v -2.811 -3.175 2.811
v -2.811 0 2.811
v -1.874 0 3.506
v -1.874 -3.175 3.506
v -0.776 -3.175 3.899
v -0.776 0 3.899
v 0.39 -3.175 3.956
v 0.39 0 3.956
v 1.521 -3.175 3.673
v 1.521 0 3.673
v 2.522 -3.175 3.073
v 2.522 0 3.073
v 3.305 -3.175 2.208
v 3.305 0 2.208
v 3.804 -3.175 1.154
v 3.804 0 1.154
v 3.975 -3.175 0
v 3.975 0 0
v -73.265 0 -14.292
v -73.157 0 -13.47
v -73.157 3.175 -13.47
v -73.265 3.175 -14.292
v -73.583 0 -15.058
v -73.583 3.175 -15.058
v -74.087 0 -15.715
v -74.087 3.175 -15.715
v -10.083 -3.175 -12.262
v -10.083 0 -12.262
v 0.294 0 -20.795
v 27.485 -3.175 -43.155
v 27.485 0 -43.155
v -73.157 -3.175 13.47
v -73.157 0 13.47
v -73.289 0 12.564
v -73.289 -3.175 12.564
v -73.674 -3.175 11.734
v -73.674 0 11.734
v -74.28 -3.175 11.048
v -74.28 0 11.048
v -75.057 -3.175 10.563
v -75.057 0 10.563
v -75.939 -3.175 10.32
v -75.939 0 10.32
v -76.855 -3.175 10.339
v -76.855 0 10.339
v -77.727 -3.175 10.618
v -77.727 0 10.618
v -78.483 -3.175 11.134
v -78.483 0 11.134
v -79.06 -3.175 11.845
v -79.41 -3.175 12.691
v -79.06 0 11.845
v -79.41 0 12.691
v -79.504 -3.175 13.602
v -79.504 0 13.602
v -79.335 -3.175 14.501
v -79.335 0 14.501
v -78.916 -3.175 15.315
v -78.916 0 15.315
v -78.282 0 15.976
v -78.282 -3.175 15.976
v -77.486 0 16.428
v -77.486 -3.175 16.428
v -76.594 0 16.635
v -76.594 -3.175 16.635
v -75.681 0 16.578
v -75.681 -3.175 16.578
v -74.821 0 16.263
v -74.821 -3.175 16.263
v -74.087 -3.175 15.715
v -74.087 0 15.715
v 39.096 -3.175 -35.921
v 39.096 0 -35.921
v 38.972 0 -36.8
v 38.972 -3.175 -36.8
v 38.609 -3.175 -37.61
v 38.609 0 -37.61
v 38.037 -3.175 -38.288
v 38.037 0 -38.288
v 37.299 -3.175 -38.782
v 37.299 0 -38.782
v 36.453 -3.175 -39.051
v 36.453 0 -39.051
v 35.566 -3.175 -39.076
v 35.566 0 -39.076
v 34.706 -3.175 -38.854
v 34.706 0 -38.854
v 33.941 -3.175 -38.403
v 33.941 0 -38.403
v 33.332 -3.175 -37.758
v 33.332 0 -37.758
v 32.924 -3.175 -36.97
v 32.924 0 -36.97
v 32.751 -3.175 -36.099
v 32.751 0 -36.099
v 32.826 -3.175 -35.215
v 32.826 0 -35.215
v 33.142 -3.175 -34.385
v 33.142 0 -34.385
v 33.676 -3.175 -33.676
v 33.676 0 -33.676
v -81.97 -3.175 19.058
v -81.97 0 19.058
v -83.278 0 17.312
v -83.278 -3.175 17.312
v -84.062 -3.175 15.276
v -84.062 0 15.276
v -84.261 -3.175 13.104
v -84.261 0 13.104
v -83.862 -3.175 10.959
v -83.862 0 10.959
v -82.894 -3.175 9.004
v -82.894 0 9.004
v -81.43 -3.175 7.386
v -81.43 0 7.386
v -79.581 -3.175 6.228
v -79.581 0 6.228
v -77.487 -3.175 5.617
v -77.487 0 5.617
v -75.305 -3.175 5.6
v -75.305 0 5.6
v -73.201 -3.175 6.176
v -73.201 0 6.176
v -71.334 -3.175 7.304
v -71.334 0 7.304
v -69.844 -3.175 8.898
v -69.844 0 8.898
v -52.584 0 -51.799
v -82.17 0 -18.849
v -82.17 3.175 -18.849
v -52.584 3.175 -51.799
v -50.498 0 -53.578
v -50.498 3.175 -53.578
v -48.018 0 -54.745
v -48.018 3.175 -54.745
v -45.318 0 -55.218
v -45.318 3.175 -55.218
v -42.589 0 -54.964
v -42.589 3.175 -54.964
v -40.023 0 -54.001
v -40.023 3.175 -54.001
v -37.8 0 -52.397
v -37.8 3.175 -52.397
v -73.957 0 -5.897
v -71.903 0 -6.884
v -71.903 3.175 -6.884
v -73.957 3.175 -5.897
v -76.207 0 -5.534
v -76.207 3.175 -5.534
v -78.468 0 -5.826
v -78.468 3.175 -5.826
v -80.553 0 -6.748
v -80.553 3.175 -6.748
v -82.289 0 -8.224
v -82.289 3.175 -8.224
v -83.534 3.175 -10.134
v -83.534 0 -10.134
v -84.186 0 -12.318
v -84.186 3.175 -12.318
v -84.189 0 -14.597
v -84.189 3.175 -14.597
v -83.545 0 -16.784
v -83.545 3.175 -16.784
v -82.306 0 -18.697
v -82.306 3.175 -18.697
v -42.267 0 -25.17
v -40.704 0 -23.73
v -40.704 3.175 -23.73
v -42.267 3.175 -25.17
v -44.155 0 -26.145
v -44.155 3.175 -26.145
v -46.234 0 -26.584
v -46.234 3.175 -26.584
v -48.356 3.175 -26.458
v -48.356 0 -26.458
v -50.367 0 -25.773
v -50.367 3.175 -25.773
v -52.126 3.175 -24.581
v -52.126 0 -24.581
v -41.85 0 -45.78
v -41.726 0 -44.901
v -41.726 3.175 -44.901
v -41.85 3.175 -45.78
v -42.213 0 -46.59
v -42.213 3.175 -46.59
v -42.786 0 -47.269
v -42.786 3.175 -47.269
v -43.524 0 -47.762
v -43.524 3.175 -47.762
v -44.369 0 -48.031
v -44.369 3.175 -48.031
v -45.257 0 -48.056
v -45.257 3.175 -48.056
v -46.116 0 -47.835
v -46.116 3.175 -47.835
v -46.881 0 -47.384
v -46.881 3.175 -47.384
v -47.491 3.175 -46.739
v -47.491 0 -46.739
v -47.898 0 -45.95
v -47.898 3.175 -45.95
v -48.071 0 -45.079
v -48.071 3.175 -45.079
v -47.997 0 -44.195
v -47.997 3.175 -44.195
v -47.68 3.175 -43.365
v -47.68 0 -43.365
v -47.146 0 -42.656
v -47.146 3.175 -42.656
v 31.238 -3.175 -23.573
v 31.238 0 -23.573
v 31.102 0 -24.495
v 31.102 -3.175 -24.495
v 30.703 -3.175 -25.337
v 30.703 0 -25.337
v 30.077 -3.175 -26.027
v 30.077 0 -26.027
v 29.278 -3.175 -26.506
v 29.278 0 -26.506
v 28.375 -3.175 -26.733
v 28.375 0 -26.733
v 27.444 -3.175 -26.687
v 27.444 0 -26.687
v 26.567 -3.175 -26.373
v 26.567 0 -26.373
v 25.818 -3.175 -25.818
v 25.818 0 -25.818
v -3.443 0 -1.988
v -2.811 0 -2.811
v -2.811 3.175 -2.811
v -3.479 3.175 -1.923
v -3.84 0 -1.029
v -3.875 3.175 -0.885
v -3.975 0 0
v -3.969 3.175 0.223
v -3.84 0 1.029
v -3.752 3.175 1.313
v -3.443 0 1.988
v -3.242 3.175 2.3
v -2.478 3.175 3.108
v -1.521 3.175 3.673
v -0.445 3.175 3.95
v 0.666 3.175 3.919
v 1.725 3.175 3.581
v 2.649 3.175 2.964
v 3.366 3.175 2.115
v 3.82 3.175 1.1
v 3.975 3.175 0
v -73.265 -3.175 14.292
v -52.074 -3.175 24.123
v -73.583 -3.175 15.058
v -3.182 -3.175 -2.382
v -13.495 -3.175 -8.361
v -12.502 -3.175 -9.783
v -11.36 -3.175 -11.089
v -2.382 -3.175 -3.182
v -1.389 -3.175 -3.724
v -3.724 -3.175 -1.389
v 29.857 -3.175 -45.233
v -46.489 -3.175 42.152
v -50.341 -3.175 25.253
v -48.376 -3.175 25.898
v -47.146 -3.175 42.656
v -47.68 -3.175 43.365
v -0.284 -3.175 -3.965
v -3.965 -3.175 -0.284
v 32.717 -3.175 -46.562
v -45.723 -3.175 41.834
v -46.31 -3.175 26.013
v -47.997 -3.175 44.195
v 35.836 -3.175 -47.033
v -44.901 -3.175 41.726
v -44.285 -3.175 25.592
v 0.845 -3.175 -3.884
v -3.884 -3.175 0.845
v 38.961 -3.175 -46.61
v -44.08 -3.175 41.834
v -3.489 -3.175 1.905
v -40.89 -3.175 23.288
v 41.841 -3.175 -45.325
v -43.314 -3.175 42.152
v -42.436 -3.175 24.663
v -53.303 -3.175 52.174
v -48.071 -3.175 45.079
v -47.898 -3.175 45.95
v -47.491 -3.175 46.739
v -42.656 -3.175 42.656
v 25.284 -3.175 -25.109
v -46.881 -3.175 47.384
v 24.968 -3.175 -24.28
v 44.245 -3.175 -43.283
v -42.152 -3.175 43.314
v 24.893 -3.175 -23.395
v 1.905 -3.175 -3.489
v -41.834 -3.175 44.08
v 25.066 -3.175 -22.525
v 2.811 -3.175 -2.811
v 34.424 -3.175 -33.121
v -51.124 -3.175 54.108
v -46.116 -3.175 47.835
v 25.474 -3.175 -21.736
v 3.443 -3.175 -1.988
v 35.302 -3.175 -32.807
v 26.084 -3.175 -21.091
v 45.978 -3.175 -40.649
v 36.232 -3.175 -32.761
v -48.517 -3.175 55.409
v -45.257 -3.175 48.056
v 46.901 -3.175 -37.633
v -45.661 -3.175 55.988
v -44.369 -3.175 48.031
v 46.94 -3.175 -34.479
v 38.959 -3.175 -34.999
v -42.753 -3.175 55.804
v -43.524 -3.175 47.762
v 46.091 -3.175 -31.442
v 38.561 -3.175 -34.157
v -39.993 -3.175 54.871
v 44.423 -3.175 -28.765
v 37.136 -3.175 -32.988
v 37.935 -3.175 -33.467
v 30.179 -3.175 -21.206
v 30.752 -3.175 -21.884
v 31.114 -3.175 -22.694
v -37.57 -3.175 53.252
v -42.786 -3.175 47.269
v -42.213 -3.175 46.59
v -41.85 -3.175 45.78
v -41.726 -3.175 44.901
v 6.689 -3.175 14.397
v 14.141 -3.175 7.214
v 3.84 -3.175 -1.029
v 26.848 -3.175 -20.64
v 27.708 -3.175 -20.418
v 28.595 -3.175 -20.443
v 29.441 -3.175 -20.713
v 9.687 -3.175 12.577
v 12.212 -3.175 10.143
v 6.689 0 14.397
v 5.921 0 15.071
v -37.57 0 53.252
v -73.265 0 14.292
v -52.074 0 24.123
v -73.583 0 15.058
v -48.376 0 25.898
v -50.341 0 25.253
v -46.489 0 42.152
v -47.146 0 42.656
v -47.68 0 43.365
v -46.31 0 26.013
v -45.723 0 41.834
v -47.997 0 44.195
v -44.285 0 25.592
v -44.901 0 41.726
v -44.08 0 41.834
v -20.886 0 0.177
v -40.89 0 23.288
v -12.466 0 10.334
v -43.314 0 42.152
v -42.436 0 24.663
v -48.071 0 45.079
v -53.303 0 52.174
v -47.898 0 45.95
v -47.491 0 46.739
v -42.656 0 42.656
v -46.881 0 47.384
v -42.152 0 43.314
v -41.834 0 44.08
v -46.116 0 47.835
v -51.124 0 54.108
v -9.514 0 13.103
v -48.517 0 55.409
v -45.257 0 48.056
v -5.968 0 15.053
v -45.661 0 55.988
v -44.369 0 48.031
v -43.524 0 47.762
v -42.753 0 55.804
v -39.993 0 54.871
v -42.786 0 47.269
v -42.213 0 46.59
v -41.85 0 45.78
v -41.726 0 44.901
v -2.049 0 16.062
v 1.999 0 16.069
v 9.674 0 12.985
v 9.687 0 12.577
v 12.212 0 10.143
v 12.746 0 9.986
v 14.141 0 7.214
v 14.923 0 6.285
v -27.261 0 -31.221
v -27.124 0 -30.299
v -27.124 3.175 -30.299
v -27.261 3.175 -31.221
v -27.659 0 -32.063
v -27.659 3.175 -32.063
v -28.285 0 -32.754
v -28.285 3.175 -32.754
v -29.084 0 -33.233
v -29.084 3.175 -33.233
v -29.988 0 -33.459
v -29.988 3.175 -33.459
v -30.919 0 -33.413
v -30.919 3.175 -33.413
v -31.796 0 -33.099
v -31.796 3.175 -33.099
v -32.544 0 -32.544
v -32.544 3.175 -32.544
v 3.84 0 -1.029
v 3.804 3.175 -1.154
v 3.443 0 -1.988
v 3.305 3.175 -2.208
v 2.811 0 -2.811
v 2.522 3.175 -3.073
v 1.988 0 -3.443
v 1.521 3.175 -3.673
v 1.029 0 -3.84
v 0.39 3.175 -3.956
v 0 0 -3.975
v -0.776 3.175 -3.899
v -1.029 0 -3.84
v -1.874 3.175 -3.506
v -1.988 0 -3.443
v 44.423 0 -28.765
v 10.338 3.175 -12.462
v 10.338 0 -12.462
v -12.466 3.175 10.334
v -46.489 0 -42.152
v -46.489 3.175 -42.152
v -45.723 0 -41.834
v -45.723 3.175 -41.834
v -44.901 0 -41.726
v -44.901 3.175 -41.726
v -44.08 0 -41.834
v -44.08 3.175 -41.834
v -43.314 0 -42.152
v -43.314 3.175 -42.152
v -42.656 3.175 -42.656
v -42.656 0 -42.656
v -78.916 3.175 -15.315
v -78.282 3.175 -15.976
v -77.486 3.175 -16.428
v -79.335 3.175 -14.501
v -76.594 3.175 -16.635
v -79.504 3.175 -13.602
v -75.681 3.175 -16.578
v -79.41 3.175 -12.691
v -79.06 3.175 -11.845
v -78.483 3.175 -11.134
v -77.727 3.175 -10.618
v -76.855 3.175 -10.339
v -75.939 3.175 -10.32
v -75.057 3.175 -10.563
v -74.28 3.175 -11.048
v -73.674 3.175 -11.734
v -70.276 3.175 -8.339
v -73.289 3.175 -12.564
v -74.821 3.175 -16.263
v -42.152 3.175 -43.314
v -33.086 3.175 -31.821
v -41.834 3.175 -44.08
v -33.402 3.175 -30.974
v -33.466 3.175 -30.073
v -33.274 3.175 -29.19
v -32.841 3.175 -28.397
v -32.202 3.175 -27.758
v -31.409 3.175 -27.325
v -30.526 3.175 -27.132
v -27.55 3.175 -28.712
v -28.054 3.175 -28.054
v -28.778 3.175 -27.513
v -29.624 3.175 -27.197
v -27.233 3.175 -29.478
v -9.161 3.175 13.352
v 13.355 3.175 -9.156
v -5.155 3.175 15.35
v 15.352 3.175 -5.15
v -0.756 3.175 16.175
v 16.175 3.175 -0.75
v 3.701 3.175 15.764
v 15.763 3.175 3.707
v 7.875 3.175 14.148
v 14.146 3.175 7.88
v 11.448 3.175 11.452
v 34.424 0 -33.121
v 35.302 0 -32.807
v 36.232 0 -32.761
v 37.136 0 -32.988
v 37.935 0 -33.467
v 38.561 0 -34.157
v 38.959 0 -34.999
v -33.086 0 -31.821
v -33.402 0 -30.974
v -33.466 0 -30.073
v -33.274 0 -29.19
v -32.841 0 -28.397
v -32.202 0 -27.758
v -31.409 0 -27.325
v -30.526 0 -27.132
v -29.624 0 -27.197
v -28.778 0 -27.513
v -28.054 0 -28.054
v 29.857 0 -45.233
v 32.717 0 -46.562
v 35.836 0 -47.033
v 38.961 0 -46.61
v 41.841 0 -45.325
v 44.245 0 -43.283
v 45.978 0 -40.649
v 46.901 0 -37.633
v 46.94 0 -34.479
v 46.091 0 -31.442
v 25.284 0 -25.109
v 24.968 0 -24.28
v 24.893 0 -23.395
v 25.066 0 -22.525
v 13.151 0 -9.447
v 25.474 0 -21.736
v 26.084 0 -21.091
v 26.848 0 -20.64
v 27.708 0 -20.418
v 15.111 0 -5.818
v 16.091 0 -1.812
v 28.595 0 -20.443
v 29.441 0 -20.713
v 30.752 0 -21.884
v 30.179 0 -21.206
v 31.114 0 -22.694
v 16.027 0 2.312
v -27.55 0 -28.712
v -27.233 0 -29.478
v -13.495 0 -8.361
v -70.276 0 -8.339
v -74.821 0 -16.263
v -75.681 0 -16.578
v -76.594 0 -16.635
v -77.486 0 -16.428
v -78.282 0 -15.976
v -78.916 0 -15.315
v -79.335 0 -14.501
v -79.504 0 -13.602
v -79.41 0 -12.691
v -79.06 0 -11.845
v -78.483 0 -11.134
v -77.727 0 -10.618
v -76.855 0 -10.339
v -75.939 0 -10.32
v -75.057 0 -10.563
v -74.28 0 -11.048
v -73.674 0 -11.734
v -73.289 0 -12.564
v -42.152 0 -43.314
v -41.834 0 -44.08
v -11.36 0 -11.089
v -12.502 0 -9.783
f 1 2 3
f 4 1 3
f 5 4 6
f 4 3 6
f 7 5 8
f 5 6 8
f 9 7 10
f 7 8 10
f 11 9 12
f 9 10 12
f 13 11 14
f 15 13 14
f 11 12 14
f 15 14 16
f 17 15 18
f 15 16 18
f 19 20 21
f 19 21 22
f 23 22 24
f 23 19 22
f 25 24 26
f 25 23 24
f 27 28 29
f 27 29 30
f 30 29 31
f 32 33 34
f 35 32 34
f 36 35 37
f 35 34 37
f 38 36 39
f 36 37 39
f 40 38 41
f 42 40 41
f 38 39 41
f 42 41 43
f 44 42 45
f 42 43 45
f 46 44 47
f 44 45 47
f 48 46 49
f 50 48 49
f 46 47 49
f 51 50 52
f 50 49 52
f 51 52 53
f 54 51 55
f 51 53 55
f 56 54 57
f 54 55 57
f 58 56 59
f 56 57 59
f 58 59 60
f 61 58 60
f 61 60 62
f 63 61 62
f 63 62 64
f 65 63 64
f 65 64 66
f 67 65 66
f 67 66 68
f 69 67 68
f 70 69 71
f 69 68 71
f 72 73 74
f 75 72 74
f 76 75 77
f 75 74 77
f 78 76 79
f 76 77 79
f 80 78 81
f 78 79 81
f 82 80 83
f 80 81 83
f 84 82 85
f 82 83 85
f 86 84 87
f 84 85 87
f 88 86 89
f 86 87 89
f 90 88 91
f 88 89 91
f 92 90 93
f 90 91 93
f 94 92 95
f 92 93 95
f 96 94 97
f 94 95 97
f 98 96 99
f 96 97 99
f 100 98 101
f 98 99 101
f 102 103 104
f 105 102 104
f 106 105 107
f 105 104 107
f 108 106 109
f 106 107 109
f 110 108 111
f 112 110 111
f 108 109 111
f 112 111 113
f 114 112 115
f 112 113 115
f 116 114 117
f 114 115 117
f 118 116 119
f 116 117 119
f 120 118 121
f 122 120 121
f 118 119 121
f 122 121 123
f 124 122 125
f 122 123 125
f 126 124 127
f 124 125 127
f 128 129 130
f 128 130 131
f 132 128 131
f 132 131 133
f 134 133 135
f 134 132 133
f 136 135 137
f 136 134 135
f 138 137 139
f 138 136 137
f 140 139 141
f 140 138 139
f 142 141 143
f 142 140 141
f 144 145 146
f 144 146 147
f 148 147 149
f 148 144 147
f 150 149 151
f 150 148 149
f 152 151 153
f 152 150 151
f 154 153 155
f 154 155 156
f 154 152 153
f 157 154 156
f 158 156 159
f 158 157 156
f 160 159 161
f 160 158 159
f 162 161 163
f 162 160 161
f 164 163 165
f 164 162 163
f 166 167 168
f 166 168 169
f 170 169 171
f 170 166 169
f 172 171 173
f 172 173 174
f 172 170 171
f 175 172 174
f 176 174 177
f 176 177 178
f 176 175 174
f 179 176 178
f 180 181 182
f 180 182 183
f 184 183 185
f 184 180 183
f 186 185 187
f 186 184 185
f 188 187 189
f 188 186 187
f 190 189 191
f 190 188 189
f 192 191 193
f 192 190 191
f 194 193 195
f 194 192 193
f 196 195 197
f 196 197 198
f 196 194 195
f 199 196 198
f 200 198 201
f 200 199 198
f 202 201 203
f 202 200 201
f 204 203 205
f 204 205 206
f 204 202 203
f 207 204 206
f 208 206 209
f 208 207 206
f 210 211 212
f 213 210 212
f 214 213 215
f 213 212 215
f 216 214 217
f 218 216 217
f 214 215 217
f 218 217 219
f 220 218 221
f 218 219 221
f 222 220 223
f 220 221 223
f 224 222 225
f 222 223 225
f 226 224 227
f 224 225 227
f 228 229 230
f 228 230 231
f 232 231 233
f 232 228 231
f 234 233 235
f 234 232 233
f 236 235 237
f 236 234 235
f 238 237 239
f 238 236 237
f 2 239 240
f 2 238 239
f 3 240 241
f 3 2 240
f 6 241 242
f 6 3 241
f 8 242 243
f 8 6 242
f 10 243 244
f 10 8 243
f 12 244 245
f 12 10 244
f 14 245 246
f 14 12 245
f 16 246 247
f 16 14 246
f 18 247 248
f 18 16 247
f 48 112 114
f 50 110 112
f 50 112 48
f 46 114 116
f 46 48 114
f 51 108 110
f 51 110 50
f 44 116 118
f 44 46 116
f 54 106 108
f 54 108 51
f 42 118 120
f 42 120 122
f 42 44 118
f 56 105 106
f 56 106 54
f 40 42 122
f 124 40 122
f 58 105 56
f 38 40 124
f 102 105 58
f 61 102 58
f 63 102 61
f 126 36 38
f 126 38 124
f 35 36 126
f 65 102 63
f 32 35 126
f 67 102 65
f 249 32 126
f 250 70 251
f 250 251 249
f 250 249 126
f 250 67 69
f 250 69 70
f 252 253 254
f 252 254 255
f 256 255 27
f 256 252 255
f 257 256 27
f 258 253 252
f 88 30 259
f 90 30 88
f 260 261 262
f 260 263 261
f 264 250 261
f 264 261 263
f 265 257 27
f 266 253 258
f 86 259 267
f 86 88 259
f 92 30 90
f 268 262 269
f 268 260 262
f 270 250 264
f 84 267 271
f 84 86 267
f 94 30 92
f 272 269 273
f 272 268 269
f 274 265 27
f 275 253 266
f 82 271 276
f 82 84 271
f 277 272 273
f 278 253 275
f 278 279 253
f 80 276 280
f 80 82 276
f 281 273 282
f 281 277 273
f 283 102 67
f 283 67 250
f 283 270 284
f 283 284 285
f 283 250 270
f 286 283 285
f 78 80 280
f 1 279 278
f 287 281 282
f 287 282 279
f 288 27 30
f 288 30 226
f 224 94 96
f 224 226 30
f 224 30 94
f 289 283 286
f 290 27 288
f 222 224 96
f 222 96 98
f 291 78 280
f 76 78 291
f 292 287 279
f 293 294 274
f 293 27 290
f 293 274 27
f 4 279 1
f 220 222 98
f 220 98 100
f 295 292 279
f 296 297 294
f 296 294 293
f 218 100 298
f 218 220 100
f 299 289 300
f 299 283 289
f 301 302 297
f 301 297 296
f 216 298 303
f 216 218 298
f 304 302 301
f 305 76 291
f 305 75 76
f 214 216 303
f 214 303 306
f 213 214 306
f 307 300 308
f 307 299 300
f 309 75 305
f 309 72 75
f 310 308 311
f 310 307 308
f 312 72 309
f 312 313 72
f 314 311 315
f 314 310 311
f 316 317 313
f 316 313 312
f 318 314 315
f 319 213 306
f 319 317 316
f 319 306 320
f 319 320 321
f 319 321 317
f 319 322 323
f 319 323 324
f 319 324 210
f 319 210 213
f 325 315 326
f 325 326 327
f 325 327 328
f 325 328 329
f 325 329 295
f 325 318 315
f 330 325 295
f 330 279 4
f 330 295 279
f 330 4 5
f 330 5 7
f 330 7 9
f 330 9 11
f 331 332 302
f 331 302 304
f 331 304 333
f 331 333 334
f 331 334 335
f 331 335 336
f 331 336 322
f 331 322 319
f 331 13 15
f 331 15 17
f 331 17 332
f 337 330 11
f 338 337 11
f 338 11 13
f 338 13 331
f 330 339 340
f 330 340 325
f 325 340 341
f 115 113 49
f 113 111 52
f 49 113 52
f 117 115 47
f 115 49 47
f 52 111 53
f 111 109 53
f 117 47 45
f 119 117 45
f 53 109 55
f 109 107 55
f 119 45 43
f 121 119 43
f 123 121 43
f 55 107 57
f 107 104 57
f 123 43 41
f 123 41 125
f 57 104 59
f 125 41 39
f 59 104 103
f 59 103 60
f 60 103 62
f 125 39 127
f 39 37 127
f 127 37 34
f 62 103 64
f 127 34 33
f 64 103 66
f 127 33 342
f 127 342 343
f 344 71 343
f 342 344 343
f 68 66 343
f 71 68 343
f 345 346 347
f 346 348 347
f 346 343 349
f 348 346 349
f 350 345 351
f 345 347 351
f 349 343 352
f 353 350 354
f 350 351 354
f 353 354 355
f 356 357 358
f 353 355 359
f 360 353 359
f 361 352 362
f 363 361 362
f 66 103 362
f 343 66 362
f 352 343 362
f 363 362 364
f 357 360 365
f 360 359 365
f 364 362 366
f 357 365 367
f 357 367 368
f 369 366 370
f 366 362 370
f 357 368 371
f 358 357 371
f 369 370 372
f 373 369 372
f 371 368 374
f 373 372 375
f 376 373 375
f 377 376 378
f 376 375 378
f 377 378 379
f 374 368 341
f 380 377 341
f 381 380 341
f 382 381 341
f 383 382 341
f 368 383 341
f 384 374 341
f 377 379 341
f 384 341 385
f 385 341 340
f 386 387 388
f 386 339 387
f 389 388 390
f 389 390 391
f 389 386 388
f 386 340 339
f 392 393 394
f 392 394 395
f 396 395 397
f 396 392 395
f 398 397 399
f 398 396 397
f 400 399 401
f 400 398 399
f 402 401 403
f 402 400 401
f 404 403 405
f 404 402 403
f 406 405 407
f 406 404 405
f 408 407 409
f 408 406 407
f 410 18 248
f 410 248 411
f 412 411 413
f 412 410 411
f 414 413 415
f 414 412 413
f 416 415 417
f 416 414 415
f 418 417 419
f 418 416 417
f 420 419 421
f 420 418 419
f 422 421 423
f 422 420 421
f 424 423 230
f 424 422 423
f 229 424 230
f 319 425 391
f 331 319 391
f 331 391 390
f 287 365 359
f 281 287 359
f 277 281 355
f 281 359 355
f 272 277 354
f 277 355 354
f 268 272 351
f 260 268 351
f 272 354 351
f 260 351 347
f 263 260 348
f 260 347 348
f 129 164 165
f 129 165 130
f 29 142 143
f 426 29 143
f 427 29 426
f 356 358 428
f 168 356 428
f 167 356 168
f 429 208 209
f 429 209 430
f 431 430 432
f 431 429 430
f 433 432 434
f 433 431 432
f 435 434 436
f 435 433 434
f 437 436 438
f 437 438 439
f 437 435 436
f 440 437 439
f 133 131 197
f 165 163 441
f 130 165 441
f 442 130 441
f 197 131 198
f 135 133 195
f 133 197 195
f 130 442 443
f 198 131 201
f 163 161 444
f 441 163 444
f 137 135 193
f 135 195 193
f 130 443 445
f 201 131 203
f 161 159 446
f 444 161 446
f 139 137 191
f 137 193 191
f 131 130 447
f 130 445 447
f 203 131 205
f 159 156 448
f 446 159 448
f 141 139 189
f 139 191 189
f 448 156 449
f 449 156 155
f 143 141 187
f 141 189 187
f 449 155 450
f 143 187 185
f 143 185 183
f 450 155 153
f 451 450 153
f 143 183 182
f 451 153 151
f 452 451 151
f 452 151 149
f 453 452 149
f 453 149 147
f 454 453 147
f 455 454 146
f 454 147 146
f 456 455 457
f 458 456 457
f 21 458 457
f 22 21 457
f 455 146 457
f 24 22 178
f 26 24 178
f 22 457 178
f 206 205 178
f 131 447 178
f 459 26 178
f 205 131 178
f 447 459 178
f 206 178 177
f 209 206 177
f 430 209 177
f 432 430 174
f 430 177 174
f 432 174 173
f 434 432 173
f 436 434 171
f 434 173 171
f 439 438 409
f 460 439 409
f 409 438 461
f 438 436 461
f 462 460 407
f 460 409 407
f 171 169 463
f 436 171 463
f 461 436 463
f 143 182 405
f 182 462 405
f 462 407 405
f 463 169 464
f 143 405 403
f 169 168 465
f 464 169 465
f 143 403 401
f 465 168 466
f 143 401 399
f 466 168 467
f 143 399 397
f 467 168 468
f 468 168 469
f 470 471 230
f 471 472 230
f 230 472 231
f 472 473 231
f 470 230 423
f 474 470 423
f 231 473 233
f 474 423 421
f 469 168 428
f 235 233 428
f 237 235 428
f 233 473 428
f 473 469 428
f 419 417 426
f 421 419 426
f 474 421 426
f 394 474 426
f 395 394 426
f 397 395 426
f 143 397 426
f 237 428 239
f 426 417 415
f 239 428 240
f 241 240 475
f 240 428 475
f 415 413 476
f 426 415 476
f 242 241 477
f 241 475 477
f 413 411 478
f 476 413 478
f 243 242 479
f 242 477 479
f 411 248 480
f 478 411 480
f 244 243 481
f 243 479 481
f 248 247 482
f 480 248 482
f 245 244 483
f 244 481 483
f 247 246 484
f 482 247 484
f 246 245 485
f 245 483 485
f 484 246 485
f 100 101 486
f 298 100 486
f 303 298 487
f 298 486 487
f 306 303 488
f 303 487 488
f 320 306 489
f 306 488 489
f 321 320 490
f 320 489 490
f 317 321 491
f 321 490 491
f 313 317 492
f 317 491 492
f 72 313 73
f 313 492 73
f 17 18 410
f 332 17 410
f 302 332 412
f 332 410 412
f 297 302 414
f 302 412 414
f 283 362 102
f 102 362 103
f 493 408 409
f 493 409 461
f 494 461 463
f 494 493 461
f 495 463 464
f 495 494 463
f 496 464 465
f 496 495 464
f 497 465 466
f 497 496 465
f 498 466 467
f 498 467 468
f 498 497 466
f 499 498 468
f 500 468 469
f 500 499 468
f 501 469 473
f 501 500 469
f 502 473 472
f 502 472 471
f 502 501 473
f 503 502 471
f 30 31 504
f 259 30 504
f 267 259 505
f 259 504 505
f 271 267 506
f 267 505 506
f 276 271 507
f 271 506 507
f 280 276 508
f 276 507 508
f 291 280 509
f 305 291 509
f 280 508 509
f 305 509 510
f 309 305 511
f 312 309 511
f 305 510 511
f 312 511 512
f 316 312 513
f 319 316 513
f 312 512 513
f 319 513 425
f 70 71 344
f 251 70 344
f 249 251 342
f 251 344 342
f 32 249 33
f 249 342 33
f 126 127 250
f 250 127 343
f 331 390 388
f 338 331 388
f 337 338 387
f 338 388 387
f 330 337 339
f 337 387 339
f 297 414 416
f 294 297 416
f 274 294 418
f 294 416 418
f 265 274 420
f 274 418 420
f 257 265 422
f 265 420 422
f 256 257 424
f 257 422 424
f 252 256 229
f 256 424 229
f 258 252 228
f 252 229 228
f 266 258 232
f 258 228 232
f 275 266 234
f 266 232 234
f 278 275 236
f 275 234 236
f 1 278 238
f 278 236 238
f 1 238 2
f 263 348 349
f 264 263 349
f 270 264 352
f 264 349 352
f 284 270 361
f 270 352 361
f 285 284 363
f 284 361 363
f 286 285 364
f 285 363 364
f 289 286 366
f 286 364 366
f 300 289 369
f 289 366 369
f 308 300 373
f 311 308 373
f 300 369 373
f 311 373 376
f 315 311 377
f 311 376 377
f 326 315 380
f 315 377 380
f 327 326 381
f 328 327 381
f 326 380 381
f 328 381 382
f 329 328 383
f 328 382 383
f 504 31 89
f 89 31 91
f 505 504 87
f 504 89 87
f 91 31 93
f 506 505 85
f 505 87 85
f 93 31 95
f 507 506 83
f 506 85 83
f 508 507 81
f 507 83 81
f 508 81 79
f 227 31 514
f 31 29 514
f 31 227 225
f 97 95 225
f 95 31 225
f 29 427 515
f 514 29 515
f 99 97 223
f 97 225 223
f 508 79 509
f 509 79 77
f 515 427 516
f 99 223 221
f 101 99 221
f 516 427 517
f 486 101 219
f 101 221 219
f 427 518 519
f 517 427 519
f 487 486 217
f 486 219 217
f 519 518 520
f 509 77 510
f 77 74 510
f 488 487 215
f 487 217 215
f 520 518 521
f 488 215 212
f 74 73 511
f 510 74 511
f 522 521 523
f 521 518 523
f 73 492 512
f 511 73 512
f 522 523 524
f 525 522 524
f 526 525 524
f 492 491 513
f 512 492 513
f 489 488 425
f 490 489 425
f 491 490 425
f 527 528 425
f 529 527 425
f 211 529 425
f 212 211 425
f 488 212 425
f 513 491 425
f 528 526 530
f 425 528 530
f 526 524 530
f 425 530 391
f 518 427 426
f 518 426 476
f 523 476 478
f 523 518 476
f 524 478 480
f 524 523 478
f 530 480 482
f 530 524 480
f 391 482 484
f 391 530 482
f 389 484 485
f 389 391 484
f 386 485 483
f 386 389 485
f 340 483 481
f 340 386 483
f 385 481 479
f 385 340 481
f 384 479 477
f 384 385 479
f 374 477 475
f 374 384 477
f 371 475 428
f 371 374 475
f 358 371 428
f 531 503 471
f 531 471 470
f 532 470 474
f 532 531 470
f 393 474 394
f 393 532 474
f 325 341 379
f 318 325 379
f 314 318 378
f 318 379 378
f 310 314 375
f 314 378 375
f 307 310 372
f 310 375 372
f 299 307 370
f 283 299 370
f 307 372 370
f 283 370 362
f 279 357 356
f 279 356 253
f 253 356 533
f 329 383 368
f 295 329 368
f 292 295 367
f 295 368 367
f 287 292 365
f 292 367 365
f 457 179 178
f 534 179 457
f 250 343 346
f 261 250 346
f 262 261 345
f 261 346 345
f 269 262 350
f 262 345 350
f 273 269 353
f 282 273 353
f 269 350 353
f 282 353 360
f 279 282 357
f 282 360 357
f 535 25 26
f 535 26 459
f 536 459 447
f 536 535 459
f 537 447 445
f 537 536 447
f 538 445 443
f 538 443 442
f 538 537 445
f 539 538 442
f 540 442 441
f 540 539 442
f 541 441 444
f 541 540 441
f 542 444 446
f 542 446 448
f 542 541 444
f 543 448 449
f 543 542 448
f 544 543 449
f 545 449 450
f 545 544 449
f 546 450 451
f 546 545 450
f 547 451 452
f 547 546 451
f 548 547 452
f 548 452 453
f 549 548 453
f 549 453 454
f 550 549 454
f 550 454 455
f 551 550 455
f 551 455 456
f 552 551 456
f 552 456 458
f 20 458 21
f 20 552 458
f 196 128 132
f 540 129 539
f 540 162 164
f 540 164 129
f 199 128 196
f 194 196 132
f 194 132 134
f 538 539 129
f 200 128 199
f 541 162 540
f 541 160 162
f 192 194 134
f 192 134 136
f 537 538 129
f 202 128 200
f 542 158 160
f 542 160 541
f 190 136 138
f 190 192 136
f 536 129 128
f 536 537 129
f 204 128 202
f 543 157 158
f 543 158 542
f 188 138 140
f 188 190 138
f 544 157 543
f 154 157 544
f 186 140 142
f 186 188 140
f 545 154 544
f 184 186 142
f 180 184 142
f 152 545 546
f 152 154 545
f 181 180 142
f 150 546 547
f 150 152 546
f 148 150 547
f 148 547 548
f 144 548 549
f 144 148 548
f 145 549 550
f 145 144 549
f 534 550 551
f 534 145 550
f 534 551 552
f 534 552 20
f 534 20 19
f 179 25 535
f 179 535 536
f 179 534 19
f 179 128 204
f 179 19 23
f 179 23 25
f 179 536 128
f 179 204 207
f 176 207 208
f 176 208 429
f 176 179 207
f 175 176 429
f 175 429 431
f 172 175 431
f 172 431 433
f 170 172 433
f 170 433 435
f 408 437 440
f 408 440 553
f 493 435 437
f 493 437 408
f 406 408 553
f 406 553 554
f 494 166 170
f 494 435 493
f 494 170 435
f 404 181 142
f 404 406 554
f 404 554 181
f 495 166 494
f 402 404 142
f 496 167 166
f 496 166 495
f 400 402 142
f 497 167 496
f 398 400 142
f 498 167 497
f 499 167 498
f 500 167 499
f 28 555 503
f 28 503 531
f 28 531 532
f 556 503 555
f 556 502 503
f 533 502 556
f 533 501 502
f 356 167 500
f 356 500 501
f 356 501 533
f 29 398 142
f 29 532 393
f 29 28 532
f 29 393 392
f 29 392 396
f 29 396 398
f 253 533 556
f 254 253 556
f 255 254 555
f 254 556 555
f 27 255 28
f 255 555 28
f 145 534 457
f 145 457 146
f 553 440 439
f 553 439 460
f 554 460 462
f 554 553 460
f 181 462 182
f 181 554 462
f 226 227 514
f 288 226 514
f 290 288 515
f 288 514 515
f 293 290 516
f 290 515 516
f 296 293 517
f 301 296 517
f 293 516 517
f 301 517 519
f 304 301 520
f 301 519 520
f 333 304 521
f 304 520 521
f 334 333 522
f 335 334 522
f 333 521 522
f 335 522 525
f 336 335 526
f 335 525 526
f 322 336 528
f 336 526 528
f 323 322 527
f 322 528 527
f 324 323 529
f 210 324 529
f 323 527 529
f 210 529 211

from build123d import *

# Parameters (mm, degrees)
F1_DEPTH = 3.175
F3_DEPTH = 3.175


with BuildPart() as f1:
    # F0 (on Front) → F1 (new body)
    with BuildSketch(Plane.XZ):
        with BuildLine():
            ThreePointArc((-13.4948678072, -8.3608712384), (-15.7694846608, 1.8272872063), (-11.2253201513, 11.2253201513))
            Line((-11.2253201513, 11.2253201513), (-37.0435564994, 37.0435564994))
            ThreePointArc((-37.0435564994, 37.0435564994), (-44.9012806053, 33.7887806053), (-52.7590047113, 37.0435564994))
            Line((-52.7590047113, 37.0435564994), (-70.7195169534, 19.0830442573))
            ThreePointArc((-70.7195169534, 19.0830442573), (-68.9988832398, 16.507933926), (-68.3946770291, 13.4703841816))
            ThreePointArc((-68.3946770291, 13.4703841816), (-68.7656870241, 11.0720232299), (-69.8440339436, 8.8978678555))
            Line((-69.8440339436, 8.8978678555), (-52.0741189422, 24.1225312549))
            ThreePointArc((-52.0741189422, 24.1225312549), (-46.3101415882, 26.0133414911), (-40.8904602416, 23.2883364656))
            Line((-40.8904602416, 23.2883364656), (-13.4948678072, -8.3608712384))
        make_face()
        with BuildLine():
            Line((-70.7195169534, 19.0830442573), (-52.7590047113, 37.0435564994))
            ThreePointArc((-52.7590047113, 37.0435564994), (-56.0066011093, 44.501890128), (-53.3031631019, 52.1742460778))
            Line((-53.3031631019, 52.1742460778), (-81.9696297644, 19.0581415947))
            ThreePointArc((-81.9696297644, 19.0581415947), (-76.3497470218, 21.4078647356), (-70.7195169534, 19.0830442573))
        make_face()
        with BuildLine():
            ThreePointArc((-52.7590047113, 37.0435564994), (-44.9012806053, 33.7887806053), (-37.0435564994, 37.0435564994))
            Line((-37.0435564994, 37.0435564994), (-42.6562165751, 42.6562165751))
            ThreePointArc((-42.6562165751, 42.6562165751), (-44.9012806053, 41.7262806053), (-47.1463446356, 42.6562165751))
            Line((-47.1463446356, 42.6562165751), (-52.7590047113, 37.0435564994))
        make_face()
        with BuildLine():
            Line((-37.0435564994, 37.0435564994), (-11.2253201513, 11.2253201513))
            ThreePointArc((-11.2253201513, 11.2253201513), (-2.7677824051, 15.6318586725), (6.6885940582, 14.397164114))
            Line((6.6885940582, 14.397164114), (-37.5698837561, 53.2522252519))
            ThreePointArc((-37.5698837561, 53.2522252519), (-34.7780942558, 49.4848113821), (-33.7887806053, 44.9012806053))
            ThreePointArc((-33.7887806053, 44.9012806053), (-34.6346693003, 40.6487109632), (-37.0435564994, 37.0435564994))
        make_face()
        with BuildLine():
            Line((-42.6562165751, 42.6562165751), (-37.0435564994, 37.0435564994))
            ThreePointArc((-37.0435564994, 37.0435564994), (-34.6346693003, 40.6487109632), (-33.7887806053, 44.9012806053))
            ThreePointArc((-33.7887806053, 44.9012806053), (-34.7780942558, 49.4848113821), (-37.5698837561, 53.2522252519))
            ThreePointArc((-37.5698837561, 53.2522252519), (-45.6608822478, 55.9877886938), (-53.3031631019, 52.1742460778))
            ThreePointArc((-53.3031631019, 52.1742460778), (-56.0066011093, 44.501890128), (-52.7590047113, 37.0435564994))
            Line((-52.7590047113, 37.0435564994), (-47.1463446356, 42.6562165751))
            ThreePointArc((-47.1463446356, 42.6562165751), (-46.1163005031, 47.8345981211), (-41.7262806053, 44.9012806053))
            ThreePointArc((-41.7262806053, 44.9012806053), (-41.9679630896, 43.6862607076), (-42.6562165751, 42.6562165751))
        make_face()
        with BuildLine():
            ThreePointArc((-68.3946770291, 13.4703841816), (-68.9988832398, 16.507933926), (-70.7195169534, 19.0830442573))
            ThreePointArc((-70.7195169534, 19.0830442573), (-76.3497470218, 21.4078647356), (-81.9696297644, 19.0581415947))
            ThreePointArc((-81.9696297644, 19.0581415947), (-81.4300892617, 7.3863725841), (-69.8440339436, 8.8978678555))
            ThreePointArc((-69.8440339436, 8.8978678555), (-68.7656870241, 11.0720232299), (-68.3946770291, 13.4703841816))
        make_face()
        with BuildLine():
            ThreePointArc((-73.1571770291, 13.4703841816), (-79.2654945448, 12.2553642838), (-74.0871129988, 15.7154482119))
            ThreePointArc((-74.0871129988, 15.7154482119), (-73.3988595134, 14.6854040794), (-73.1571770291, 13.4703841816))
        make_face(mode=Mode.SUBTRACT)
        with BuildLine():
            ThreePointArc((-2.8108201659, 2.8108201659), (1.521204912, 3.6725135297), (3.9751, 0))
            ThreePointArc((3.9751, 0), (3.6725135297, -1.521204912), (2.8108201659, -2.8108201659))
            Line((2.8108201659, -2.8108201659), (11.2253201513, -11.2253201513))
            ThreePointArc((11.2253201513, -11.2253201513), (14.6665875786, -6.0750994888), (15.875, 0))
            ThreePointArc((15.875, 0), (15.4354295053, 3.7098707505), (14.1410609782, 7.2142927173))
            ThreePointArc((14.1410609782, 7.2142927173), (11.0166711219, 11.4301610833), (6.6885940582, 14.397164114))
            ThreePointArc((6.6885940582, 14.397164114), (-2.7677824051, 15.6318586725), (-11.2253201513, 11.2253201513))
            Line((-11.2253201513, 11.2253201513), (-2.8108201659, 2.8108201659))
        make_face()
        with BuildLine():
            ThreePointArc((2.8108201659, -2.8108201659), (-2.8108201659, -2.8108201659), (-2.8108201659, 2.8108201659))
            Line((-2.8108201659, 2.8108201659), (-11.2253201513, 11.2253201513))
            ThreePointArc((-11.2253201513, 11.2253201513), (-15.7694846608, 1.8272872063), (-13.4948678072, -8.3608712384))
            ThreePointArc((-13.4948678072, -8.3608712384), (-11.9491778628, -10.4514483878), (-10.0829819903, -12.2616923458))
            ThreePointArc((-10.0829819903, -12.2616923458), (0.7712009789, -15.8562566216), (11.2253201513, -11.2253201513))
            Line((11.2253201513, -11.2253201513), (2.8108201659, -2.8108201659))
        make_face()
        with BuildLine():
            Line((25.8182363481, -25.8182363481), (11.2253201513, -11.2253201513))
            ThreePointArc((11.2253201513, -11.2253201513), (0.7712009789, -15.8562566216), (-10.0829819903, -12.2616923458))
            Line((-10.0829819903, -12.2616923458), (27.4852123563, -43.1546079663))
            ThreePointArc((27.4852123563, -43.1546079663), (24.8166684953, -35.4956607342), (28.0633003783, -28.0633003783))
            Line((28.0633003783, -28.0633003783), (25.8182363481, -25.8182363481))
        make_face()
        with BuildLine():
            ThreePointArc((15.875, 0), (14.6665875786, -6.0750994888), (11.2253201513, -11.2253201513))
            Line((11.2253201513, -11.2253201513), (25.8182363481, -25.8182363481))
            Line((25.8182363481, -25.8182363481), (28.0633003783, -28.0633003783))
            ThreePointArc((28.0633003783, -28.0633003783), (36.3974750277, -24.8187431363), (44.4230423823, -28.7653730177))
            Line((44.4230423823, -28.7653730177), (14.1410609782, 7.2142927173))
            ThreePointArc((14.1410609782, 7.2142927173), (15.4354295053, 3.7098707505), (15.875, 0))
        make_face()
        with BuildLine():
            ThreePointArc((31.2383003783, -23.5731723178), (29.2783202761, -26.5064898335), (25.8182363481, -25.8182363481))
            ThreePointArc((25.8182363481, -25.8182363481), (26.8482804806, -20.6398548021), (31.2383003783, -23.5731723178))
        make_face(mode=Mode.SUBTRACT)
        with BuildLine():
            ThreePointArc((28.0633003783, -28.0633003783), (24.8166684953, -35.4956607342), (27.4852123563, -43.1546079663))
            ThreePointArc((27.4852123563, -43.1546079663), (39.7774926857, -46.3428913641), (47.0335244843, -35.9210244843))
            ThreePointArc((47.0335244843, -35.9210244843), (46.3605247152, -32.1125482563), (44.4230423823, -28.7653730177))
            ThreePointArc((44.4230423823, -28.7653730177), (36.3974750277, -24.8187431363), (28.0633003783, -28.0633003783))
        make_face()
        with BuildLine():
            ThreePointArc((39.0960244843, -35.9210244843), (34.7060045865, -38.854342), (33.675960454, -33.675960454))
            ThreePointArc((33.675960454, -33.675960454), (37.136044382, -32.9877069686), (39.0960244843, -35.9210244843))
        make_face(mode=Mode.SUBTRACT)
    extrude(amount=F1_DEPTH)

    # F2 (on Front) → F3 (join)
    with BuildSketch(Plane.XZ):
        with BuildLine():
            Line((-37.8002404479, -52.3968071841), (10.3384674722, -12.4624695216))
            ThreePointArc((10.3384674722, -12.4624695216), (11.4477925566, 11.4518601908), (-12.4661415509, 10.3340394368))
            Line((-12.4661415509, 10.3340394368), (-40.7040933076, -23.7299203398))
            ThreePointArc((-40.7040933076, -23.7299203398), (-46.2342528039, -26.5843517404), (-52.126234613, -24.5806069871))
            Line((-52.126234613, -24.5806069871), (-70.2762329196, -8.3391614041))
            ThreePointArc((-70.2762329196, -8.3391614041), (-68.8798967533, -10.737725231), (-68.3946770291, -13.4703841816))
            ThreePointArc((-68.3946770291, -13.4703841816), (-68.9988832398, -16.507933926), (-70.7195169534, -19.0830442573))
            Line((-70.7195169534, -19.0830442573), (-52.2022288318, -37.6003323789))
            ThreePointArc((-52.2022288318, -37.6003323789), (-44.9012806053, -34.5761806053), (-37.6003323789, -37.6003323789))
            ThreePointArc((-37.6003323789, -37.6003323789), (-35.3621320442, -40.9500358978), (-34.5761806053, -44.9012806053))
            ThreePointArc((-34.5761806053, -44.9012806053), (-35.4163810345, -48.9810318405), (-37.8002404479, -52.3968071841))
        make_face()
        with BuildLine():
            ThreePointArc((-27.1243841525, -30.2993841525), (-29.0843642547, -33.2327016682), (-32.5444481828, -32.5444481828))
            ThreePointArc((-32.5444481828, -32.5444481828), (-32.5444481828, -28.0543201222), (-28.0543201222, -28.0543201222))
            ThreePointArc((-28.0543201222, -28.0543201222), (-27.3660666368, -29.0843642547), (-27.1243841525, -30.2993841525))
        make_face(mode=Mode.SUBTRACT)
        with BuildLine():
            ThreePointArc((3.9751, 0), (1.521204912, -3.6725135297), (-2.8108201659, -2.8108201659))
            ThreePointArc((-2.8108201659, -2.8108201659), (-1.521204912, 3.6725135297), (3.9751, 0))
        make_face(mode=Mode.SUBTRACT)
        with BuildLine():
            Line((-82.1697332902, -18.8487522564), (-52.5839556456, -51.799410369))
            ThreePointArc((-52.5839556456, -51.799410369), (-55.2226514199, -44.6238017438), (-52.2022288318, -37.6003323789))
            Line((-52.2022288318, -37.6003323789), (-70.7195169534, -19.0830442573))
            ThreePointArc((-70.7195169534, -19.0830442573), (-76.494558552, -21.4062230466), (-82.1697332902, -18.8487522564))
        make_face()
        with BuildLine():
            ThreePointArc((-52.5839556456, -51.799410369), (-45.3181685075, -55.2179610059), (-37.8002404479, -52.3968071841))
            ThreePointArc((-37.8002404479, -52.3968071841), (-35.4163810345, -48.9810318405), (-34.5761806053, -44.9012806053))
            ThreePointArc((-34.5761806053, -44.9012806053), (-35.3621320442, -40.9500358978), (-37.6003323789, -37.6003323789))
            Line((-37.6003323789, -37.6003323789), (-42.6562165751, -42.6562165751))
            ThreePointArc((-42.6562165751, -42.6562165751), (-41.9679630896, -43.6862607076), (-41.7262806053, -44.9012806053))
            ThreePointArc((-41.7262806053, -44.9012806053), (-46.1163005031, -47.8345981211), (-47.1463446356, -42.6562165751))
            Line((-47.1463446356, -42.6562165751), (-52.2022288318, -37.6003323789))
            ThreePointArc((-52.2022288318, -37.6003323789), (-55.2226514199, -44.6238017438), (-52.5839556456, -51.799410369))
        make_face()
        with BuildLine():
            ThreePointArc((-37.6003323789, -37.6003323789), (-44.9012806053, -34.5761806053), (-52.2022288318, -37.6003323789))
            Line((-52.2022288318, -37.6003323789), (-47.1463446356, -42.6562165751))
            ThreePointArc((-47.1463446356, -42.6562165751), (-44.9012806053, -41.7262806053), (-42.6562165751, -42.6562165751))
            Line((-42.6562165751, -42.6562165751), (-37.6003323789, -37.6003323789))
        make_face()
        with BuildLine():
            Line((-82.3058785178, -18.697122818), (-82.1697332902, -18.8487522564))
            ThreePointArc((-82.1697332902, -18.8487522564), (-76.494558552, -21.4062230466), (-70.7195169534, -19.0830442573))
            ThreePointArc((-70.7195169534, -19.0830442573), (-68.9988832398, -16.507933926), (-68.3946770291, -13.4703841816))
            ThreePointArc((-68.3946770291, -13.4703841816), (-68.8798967533, -10.737725231), (-70.2762329196, -8.3391614041))
            Line((-70.2762329196, -8.3391614041), (-71.9025478223, -6.8838607177))
            ThreePointArc((-71.9025478223, -6.8838607177), (-82.2890495446, -8.2244737664), (-82.3058785178, -18.697122818))
        make_face()
        with BuildLine():
            ThreePointArc((-73.1571770291, -13.4703841816), (-73.3988595134, -14.6854040794), (-74.0871129988, -15.7154482119))
            ThreePointArc((-74.0871129988, -15.7154482119), (-79.2654945448, -12.2553642838), (-73.1571770291, -13.4703841816))
        make_face(mode=Mode.SUBTRACT)
    extrude(amount=-F3_DEPTH)


solid = f1.part
